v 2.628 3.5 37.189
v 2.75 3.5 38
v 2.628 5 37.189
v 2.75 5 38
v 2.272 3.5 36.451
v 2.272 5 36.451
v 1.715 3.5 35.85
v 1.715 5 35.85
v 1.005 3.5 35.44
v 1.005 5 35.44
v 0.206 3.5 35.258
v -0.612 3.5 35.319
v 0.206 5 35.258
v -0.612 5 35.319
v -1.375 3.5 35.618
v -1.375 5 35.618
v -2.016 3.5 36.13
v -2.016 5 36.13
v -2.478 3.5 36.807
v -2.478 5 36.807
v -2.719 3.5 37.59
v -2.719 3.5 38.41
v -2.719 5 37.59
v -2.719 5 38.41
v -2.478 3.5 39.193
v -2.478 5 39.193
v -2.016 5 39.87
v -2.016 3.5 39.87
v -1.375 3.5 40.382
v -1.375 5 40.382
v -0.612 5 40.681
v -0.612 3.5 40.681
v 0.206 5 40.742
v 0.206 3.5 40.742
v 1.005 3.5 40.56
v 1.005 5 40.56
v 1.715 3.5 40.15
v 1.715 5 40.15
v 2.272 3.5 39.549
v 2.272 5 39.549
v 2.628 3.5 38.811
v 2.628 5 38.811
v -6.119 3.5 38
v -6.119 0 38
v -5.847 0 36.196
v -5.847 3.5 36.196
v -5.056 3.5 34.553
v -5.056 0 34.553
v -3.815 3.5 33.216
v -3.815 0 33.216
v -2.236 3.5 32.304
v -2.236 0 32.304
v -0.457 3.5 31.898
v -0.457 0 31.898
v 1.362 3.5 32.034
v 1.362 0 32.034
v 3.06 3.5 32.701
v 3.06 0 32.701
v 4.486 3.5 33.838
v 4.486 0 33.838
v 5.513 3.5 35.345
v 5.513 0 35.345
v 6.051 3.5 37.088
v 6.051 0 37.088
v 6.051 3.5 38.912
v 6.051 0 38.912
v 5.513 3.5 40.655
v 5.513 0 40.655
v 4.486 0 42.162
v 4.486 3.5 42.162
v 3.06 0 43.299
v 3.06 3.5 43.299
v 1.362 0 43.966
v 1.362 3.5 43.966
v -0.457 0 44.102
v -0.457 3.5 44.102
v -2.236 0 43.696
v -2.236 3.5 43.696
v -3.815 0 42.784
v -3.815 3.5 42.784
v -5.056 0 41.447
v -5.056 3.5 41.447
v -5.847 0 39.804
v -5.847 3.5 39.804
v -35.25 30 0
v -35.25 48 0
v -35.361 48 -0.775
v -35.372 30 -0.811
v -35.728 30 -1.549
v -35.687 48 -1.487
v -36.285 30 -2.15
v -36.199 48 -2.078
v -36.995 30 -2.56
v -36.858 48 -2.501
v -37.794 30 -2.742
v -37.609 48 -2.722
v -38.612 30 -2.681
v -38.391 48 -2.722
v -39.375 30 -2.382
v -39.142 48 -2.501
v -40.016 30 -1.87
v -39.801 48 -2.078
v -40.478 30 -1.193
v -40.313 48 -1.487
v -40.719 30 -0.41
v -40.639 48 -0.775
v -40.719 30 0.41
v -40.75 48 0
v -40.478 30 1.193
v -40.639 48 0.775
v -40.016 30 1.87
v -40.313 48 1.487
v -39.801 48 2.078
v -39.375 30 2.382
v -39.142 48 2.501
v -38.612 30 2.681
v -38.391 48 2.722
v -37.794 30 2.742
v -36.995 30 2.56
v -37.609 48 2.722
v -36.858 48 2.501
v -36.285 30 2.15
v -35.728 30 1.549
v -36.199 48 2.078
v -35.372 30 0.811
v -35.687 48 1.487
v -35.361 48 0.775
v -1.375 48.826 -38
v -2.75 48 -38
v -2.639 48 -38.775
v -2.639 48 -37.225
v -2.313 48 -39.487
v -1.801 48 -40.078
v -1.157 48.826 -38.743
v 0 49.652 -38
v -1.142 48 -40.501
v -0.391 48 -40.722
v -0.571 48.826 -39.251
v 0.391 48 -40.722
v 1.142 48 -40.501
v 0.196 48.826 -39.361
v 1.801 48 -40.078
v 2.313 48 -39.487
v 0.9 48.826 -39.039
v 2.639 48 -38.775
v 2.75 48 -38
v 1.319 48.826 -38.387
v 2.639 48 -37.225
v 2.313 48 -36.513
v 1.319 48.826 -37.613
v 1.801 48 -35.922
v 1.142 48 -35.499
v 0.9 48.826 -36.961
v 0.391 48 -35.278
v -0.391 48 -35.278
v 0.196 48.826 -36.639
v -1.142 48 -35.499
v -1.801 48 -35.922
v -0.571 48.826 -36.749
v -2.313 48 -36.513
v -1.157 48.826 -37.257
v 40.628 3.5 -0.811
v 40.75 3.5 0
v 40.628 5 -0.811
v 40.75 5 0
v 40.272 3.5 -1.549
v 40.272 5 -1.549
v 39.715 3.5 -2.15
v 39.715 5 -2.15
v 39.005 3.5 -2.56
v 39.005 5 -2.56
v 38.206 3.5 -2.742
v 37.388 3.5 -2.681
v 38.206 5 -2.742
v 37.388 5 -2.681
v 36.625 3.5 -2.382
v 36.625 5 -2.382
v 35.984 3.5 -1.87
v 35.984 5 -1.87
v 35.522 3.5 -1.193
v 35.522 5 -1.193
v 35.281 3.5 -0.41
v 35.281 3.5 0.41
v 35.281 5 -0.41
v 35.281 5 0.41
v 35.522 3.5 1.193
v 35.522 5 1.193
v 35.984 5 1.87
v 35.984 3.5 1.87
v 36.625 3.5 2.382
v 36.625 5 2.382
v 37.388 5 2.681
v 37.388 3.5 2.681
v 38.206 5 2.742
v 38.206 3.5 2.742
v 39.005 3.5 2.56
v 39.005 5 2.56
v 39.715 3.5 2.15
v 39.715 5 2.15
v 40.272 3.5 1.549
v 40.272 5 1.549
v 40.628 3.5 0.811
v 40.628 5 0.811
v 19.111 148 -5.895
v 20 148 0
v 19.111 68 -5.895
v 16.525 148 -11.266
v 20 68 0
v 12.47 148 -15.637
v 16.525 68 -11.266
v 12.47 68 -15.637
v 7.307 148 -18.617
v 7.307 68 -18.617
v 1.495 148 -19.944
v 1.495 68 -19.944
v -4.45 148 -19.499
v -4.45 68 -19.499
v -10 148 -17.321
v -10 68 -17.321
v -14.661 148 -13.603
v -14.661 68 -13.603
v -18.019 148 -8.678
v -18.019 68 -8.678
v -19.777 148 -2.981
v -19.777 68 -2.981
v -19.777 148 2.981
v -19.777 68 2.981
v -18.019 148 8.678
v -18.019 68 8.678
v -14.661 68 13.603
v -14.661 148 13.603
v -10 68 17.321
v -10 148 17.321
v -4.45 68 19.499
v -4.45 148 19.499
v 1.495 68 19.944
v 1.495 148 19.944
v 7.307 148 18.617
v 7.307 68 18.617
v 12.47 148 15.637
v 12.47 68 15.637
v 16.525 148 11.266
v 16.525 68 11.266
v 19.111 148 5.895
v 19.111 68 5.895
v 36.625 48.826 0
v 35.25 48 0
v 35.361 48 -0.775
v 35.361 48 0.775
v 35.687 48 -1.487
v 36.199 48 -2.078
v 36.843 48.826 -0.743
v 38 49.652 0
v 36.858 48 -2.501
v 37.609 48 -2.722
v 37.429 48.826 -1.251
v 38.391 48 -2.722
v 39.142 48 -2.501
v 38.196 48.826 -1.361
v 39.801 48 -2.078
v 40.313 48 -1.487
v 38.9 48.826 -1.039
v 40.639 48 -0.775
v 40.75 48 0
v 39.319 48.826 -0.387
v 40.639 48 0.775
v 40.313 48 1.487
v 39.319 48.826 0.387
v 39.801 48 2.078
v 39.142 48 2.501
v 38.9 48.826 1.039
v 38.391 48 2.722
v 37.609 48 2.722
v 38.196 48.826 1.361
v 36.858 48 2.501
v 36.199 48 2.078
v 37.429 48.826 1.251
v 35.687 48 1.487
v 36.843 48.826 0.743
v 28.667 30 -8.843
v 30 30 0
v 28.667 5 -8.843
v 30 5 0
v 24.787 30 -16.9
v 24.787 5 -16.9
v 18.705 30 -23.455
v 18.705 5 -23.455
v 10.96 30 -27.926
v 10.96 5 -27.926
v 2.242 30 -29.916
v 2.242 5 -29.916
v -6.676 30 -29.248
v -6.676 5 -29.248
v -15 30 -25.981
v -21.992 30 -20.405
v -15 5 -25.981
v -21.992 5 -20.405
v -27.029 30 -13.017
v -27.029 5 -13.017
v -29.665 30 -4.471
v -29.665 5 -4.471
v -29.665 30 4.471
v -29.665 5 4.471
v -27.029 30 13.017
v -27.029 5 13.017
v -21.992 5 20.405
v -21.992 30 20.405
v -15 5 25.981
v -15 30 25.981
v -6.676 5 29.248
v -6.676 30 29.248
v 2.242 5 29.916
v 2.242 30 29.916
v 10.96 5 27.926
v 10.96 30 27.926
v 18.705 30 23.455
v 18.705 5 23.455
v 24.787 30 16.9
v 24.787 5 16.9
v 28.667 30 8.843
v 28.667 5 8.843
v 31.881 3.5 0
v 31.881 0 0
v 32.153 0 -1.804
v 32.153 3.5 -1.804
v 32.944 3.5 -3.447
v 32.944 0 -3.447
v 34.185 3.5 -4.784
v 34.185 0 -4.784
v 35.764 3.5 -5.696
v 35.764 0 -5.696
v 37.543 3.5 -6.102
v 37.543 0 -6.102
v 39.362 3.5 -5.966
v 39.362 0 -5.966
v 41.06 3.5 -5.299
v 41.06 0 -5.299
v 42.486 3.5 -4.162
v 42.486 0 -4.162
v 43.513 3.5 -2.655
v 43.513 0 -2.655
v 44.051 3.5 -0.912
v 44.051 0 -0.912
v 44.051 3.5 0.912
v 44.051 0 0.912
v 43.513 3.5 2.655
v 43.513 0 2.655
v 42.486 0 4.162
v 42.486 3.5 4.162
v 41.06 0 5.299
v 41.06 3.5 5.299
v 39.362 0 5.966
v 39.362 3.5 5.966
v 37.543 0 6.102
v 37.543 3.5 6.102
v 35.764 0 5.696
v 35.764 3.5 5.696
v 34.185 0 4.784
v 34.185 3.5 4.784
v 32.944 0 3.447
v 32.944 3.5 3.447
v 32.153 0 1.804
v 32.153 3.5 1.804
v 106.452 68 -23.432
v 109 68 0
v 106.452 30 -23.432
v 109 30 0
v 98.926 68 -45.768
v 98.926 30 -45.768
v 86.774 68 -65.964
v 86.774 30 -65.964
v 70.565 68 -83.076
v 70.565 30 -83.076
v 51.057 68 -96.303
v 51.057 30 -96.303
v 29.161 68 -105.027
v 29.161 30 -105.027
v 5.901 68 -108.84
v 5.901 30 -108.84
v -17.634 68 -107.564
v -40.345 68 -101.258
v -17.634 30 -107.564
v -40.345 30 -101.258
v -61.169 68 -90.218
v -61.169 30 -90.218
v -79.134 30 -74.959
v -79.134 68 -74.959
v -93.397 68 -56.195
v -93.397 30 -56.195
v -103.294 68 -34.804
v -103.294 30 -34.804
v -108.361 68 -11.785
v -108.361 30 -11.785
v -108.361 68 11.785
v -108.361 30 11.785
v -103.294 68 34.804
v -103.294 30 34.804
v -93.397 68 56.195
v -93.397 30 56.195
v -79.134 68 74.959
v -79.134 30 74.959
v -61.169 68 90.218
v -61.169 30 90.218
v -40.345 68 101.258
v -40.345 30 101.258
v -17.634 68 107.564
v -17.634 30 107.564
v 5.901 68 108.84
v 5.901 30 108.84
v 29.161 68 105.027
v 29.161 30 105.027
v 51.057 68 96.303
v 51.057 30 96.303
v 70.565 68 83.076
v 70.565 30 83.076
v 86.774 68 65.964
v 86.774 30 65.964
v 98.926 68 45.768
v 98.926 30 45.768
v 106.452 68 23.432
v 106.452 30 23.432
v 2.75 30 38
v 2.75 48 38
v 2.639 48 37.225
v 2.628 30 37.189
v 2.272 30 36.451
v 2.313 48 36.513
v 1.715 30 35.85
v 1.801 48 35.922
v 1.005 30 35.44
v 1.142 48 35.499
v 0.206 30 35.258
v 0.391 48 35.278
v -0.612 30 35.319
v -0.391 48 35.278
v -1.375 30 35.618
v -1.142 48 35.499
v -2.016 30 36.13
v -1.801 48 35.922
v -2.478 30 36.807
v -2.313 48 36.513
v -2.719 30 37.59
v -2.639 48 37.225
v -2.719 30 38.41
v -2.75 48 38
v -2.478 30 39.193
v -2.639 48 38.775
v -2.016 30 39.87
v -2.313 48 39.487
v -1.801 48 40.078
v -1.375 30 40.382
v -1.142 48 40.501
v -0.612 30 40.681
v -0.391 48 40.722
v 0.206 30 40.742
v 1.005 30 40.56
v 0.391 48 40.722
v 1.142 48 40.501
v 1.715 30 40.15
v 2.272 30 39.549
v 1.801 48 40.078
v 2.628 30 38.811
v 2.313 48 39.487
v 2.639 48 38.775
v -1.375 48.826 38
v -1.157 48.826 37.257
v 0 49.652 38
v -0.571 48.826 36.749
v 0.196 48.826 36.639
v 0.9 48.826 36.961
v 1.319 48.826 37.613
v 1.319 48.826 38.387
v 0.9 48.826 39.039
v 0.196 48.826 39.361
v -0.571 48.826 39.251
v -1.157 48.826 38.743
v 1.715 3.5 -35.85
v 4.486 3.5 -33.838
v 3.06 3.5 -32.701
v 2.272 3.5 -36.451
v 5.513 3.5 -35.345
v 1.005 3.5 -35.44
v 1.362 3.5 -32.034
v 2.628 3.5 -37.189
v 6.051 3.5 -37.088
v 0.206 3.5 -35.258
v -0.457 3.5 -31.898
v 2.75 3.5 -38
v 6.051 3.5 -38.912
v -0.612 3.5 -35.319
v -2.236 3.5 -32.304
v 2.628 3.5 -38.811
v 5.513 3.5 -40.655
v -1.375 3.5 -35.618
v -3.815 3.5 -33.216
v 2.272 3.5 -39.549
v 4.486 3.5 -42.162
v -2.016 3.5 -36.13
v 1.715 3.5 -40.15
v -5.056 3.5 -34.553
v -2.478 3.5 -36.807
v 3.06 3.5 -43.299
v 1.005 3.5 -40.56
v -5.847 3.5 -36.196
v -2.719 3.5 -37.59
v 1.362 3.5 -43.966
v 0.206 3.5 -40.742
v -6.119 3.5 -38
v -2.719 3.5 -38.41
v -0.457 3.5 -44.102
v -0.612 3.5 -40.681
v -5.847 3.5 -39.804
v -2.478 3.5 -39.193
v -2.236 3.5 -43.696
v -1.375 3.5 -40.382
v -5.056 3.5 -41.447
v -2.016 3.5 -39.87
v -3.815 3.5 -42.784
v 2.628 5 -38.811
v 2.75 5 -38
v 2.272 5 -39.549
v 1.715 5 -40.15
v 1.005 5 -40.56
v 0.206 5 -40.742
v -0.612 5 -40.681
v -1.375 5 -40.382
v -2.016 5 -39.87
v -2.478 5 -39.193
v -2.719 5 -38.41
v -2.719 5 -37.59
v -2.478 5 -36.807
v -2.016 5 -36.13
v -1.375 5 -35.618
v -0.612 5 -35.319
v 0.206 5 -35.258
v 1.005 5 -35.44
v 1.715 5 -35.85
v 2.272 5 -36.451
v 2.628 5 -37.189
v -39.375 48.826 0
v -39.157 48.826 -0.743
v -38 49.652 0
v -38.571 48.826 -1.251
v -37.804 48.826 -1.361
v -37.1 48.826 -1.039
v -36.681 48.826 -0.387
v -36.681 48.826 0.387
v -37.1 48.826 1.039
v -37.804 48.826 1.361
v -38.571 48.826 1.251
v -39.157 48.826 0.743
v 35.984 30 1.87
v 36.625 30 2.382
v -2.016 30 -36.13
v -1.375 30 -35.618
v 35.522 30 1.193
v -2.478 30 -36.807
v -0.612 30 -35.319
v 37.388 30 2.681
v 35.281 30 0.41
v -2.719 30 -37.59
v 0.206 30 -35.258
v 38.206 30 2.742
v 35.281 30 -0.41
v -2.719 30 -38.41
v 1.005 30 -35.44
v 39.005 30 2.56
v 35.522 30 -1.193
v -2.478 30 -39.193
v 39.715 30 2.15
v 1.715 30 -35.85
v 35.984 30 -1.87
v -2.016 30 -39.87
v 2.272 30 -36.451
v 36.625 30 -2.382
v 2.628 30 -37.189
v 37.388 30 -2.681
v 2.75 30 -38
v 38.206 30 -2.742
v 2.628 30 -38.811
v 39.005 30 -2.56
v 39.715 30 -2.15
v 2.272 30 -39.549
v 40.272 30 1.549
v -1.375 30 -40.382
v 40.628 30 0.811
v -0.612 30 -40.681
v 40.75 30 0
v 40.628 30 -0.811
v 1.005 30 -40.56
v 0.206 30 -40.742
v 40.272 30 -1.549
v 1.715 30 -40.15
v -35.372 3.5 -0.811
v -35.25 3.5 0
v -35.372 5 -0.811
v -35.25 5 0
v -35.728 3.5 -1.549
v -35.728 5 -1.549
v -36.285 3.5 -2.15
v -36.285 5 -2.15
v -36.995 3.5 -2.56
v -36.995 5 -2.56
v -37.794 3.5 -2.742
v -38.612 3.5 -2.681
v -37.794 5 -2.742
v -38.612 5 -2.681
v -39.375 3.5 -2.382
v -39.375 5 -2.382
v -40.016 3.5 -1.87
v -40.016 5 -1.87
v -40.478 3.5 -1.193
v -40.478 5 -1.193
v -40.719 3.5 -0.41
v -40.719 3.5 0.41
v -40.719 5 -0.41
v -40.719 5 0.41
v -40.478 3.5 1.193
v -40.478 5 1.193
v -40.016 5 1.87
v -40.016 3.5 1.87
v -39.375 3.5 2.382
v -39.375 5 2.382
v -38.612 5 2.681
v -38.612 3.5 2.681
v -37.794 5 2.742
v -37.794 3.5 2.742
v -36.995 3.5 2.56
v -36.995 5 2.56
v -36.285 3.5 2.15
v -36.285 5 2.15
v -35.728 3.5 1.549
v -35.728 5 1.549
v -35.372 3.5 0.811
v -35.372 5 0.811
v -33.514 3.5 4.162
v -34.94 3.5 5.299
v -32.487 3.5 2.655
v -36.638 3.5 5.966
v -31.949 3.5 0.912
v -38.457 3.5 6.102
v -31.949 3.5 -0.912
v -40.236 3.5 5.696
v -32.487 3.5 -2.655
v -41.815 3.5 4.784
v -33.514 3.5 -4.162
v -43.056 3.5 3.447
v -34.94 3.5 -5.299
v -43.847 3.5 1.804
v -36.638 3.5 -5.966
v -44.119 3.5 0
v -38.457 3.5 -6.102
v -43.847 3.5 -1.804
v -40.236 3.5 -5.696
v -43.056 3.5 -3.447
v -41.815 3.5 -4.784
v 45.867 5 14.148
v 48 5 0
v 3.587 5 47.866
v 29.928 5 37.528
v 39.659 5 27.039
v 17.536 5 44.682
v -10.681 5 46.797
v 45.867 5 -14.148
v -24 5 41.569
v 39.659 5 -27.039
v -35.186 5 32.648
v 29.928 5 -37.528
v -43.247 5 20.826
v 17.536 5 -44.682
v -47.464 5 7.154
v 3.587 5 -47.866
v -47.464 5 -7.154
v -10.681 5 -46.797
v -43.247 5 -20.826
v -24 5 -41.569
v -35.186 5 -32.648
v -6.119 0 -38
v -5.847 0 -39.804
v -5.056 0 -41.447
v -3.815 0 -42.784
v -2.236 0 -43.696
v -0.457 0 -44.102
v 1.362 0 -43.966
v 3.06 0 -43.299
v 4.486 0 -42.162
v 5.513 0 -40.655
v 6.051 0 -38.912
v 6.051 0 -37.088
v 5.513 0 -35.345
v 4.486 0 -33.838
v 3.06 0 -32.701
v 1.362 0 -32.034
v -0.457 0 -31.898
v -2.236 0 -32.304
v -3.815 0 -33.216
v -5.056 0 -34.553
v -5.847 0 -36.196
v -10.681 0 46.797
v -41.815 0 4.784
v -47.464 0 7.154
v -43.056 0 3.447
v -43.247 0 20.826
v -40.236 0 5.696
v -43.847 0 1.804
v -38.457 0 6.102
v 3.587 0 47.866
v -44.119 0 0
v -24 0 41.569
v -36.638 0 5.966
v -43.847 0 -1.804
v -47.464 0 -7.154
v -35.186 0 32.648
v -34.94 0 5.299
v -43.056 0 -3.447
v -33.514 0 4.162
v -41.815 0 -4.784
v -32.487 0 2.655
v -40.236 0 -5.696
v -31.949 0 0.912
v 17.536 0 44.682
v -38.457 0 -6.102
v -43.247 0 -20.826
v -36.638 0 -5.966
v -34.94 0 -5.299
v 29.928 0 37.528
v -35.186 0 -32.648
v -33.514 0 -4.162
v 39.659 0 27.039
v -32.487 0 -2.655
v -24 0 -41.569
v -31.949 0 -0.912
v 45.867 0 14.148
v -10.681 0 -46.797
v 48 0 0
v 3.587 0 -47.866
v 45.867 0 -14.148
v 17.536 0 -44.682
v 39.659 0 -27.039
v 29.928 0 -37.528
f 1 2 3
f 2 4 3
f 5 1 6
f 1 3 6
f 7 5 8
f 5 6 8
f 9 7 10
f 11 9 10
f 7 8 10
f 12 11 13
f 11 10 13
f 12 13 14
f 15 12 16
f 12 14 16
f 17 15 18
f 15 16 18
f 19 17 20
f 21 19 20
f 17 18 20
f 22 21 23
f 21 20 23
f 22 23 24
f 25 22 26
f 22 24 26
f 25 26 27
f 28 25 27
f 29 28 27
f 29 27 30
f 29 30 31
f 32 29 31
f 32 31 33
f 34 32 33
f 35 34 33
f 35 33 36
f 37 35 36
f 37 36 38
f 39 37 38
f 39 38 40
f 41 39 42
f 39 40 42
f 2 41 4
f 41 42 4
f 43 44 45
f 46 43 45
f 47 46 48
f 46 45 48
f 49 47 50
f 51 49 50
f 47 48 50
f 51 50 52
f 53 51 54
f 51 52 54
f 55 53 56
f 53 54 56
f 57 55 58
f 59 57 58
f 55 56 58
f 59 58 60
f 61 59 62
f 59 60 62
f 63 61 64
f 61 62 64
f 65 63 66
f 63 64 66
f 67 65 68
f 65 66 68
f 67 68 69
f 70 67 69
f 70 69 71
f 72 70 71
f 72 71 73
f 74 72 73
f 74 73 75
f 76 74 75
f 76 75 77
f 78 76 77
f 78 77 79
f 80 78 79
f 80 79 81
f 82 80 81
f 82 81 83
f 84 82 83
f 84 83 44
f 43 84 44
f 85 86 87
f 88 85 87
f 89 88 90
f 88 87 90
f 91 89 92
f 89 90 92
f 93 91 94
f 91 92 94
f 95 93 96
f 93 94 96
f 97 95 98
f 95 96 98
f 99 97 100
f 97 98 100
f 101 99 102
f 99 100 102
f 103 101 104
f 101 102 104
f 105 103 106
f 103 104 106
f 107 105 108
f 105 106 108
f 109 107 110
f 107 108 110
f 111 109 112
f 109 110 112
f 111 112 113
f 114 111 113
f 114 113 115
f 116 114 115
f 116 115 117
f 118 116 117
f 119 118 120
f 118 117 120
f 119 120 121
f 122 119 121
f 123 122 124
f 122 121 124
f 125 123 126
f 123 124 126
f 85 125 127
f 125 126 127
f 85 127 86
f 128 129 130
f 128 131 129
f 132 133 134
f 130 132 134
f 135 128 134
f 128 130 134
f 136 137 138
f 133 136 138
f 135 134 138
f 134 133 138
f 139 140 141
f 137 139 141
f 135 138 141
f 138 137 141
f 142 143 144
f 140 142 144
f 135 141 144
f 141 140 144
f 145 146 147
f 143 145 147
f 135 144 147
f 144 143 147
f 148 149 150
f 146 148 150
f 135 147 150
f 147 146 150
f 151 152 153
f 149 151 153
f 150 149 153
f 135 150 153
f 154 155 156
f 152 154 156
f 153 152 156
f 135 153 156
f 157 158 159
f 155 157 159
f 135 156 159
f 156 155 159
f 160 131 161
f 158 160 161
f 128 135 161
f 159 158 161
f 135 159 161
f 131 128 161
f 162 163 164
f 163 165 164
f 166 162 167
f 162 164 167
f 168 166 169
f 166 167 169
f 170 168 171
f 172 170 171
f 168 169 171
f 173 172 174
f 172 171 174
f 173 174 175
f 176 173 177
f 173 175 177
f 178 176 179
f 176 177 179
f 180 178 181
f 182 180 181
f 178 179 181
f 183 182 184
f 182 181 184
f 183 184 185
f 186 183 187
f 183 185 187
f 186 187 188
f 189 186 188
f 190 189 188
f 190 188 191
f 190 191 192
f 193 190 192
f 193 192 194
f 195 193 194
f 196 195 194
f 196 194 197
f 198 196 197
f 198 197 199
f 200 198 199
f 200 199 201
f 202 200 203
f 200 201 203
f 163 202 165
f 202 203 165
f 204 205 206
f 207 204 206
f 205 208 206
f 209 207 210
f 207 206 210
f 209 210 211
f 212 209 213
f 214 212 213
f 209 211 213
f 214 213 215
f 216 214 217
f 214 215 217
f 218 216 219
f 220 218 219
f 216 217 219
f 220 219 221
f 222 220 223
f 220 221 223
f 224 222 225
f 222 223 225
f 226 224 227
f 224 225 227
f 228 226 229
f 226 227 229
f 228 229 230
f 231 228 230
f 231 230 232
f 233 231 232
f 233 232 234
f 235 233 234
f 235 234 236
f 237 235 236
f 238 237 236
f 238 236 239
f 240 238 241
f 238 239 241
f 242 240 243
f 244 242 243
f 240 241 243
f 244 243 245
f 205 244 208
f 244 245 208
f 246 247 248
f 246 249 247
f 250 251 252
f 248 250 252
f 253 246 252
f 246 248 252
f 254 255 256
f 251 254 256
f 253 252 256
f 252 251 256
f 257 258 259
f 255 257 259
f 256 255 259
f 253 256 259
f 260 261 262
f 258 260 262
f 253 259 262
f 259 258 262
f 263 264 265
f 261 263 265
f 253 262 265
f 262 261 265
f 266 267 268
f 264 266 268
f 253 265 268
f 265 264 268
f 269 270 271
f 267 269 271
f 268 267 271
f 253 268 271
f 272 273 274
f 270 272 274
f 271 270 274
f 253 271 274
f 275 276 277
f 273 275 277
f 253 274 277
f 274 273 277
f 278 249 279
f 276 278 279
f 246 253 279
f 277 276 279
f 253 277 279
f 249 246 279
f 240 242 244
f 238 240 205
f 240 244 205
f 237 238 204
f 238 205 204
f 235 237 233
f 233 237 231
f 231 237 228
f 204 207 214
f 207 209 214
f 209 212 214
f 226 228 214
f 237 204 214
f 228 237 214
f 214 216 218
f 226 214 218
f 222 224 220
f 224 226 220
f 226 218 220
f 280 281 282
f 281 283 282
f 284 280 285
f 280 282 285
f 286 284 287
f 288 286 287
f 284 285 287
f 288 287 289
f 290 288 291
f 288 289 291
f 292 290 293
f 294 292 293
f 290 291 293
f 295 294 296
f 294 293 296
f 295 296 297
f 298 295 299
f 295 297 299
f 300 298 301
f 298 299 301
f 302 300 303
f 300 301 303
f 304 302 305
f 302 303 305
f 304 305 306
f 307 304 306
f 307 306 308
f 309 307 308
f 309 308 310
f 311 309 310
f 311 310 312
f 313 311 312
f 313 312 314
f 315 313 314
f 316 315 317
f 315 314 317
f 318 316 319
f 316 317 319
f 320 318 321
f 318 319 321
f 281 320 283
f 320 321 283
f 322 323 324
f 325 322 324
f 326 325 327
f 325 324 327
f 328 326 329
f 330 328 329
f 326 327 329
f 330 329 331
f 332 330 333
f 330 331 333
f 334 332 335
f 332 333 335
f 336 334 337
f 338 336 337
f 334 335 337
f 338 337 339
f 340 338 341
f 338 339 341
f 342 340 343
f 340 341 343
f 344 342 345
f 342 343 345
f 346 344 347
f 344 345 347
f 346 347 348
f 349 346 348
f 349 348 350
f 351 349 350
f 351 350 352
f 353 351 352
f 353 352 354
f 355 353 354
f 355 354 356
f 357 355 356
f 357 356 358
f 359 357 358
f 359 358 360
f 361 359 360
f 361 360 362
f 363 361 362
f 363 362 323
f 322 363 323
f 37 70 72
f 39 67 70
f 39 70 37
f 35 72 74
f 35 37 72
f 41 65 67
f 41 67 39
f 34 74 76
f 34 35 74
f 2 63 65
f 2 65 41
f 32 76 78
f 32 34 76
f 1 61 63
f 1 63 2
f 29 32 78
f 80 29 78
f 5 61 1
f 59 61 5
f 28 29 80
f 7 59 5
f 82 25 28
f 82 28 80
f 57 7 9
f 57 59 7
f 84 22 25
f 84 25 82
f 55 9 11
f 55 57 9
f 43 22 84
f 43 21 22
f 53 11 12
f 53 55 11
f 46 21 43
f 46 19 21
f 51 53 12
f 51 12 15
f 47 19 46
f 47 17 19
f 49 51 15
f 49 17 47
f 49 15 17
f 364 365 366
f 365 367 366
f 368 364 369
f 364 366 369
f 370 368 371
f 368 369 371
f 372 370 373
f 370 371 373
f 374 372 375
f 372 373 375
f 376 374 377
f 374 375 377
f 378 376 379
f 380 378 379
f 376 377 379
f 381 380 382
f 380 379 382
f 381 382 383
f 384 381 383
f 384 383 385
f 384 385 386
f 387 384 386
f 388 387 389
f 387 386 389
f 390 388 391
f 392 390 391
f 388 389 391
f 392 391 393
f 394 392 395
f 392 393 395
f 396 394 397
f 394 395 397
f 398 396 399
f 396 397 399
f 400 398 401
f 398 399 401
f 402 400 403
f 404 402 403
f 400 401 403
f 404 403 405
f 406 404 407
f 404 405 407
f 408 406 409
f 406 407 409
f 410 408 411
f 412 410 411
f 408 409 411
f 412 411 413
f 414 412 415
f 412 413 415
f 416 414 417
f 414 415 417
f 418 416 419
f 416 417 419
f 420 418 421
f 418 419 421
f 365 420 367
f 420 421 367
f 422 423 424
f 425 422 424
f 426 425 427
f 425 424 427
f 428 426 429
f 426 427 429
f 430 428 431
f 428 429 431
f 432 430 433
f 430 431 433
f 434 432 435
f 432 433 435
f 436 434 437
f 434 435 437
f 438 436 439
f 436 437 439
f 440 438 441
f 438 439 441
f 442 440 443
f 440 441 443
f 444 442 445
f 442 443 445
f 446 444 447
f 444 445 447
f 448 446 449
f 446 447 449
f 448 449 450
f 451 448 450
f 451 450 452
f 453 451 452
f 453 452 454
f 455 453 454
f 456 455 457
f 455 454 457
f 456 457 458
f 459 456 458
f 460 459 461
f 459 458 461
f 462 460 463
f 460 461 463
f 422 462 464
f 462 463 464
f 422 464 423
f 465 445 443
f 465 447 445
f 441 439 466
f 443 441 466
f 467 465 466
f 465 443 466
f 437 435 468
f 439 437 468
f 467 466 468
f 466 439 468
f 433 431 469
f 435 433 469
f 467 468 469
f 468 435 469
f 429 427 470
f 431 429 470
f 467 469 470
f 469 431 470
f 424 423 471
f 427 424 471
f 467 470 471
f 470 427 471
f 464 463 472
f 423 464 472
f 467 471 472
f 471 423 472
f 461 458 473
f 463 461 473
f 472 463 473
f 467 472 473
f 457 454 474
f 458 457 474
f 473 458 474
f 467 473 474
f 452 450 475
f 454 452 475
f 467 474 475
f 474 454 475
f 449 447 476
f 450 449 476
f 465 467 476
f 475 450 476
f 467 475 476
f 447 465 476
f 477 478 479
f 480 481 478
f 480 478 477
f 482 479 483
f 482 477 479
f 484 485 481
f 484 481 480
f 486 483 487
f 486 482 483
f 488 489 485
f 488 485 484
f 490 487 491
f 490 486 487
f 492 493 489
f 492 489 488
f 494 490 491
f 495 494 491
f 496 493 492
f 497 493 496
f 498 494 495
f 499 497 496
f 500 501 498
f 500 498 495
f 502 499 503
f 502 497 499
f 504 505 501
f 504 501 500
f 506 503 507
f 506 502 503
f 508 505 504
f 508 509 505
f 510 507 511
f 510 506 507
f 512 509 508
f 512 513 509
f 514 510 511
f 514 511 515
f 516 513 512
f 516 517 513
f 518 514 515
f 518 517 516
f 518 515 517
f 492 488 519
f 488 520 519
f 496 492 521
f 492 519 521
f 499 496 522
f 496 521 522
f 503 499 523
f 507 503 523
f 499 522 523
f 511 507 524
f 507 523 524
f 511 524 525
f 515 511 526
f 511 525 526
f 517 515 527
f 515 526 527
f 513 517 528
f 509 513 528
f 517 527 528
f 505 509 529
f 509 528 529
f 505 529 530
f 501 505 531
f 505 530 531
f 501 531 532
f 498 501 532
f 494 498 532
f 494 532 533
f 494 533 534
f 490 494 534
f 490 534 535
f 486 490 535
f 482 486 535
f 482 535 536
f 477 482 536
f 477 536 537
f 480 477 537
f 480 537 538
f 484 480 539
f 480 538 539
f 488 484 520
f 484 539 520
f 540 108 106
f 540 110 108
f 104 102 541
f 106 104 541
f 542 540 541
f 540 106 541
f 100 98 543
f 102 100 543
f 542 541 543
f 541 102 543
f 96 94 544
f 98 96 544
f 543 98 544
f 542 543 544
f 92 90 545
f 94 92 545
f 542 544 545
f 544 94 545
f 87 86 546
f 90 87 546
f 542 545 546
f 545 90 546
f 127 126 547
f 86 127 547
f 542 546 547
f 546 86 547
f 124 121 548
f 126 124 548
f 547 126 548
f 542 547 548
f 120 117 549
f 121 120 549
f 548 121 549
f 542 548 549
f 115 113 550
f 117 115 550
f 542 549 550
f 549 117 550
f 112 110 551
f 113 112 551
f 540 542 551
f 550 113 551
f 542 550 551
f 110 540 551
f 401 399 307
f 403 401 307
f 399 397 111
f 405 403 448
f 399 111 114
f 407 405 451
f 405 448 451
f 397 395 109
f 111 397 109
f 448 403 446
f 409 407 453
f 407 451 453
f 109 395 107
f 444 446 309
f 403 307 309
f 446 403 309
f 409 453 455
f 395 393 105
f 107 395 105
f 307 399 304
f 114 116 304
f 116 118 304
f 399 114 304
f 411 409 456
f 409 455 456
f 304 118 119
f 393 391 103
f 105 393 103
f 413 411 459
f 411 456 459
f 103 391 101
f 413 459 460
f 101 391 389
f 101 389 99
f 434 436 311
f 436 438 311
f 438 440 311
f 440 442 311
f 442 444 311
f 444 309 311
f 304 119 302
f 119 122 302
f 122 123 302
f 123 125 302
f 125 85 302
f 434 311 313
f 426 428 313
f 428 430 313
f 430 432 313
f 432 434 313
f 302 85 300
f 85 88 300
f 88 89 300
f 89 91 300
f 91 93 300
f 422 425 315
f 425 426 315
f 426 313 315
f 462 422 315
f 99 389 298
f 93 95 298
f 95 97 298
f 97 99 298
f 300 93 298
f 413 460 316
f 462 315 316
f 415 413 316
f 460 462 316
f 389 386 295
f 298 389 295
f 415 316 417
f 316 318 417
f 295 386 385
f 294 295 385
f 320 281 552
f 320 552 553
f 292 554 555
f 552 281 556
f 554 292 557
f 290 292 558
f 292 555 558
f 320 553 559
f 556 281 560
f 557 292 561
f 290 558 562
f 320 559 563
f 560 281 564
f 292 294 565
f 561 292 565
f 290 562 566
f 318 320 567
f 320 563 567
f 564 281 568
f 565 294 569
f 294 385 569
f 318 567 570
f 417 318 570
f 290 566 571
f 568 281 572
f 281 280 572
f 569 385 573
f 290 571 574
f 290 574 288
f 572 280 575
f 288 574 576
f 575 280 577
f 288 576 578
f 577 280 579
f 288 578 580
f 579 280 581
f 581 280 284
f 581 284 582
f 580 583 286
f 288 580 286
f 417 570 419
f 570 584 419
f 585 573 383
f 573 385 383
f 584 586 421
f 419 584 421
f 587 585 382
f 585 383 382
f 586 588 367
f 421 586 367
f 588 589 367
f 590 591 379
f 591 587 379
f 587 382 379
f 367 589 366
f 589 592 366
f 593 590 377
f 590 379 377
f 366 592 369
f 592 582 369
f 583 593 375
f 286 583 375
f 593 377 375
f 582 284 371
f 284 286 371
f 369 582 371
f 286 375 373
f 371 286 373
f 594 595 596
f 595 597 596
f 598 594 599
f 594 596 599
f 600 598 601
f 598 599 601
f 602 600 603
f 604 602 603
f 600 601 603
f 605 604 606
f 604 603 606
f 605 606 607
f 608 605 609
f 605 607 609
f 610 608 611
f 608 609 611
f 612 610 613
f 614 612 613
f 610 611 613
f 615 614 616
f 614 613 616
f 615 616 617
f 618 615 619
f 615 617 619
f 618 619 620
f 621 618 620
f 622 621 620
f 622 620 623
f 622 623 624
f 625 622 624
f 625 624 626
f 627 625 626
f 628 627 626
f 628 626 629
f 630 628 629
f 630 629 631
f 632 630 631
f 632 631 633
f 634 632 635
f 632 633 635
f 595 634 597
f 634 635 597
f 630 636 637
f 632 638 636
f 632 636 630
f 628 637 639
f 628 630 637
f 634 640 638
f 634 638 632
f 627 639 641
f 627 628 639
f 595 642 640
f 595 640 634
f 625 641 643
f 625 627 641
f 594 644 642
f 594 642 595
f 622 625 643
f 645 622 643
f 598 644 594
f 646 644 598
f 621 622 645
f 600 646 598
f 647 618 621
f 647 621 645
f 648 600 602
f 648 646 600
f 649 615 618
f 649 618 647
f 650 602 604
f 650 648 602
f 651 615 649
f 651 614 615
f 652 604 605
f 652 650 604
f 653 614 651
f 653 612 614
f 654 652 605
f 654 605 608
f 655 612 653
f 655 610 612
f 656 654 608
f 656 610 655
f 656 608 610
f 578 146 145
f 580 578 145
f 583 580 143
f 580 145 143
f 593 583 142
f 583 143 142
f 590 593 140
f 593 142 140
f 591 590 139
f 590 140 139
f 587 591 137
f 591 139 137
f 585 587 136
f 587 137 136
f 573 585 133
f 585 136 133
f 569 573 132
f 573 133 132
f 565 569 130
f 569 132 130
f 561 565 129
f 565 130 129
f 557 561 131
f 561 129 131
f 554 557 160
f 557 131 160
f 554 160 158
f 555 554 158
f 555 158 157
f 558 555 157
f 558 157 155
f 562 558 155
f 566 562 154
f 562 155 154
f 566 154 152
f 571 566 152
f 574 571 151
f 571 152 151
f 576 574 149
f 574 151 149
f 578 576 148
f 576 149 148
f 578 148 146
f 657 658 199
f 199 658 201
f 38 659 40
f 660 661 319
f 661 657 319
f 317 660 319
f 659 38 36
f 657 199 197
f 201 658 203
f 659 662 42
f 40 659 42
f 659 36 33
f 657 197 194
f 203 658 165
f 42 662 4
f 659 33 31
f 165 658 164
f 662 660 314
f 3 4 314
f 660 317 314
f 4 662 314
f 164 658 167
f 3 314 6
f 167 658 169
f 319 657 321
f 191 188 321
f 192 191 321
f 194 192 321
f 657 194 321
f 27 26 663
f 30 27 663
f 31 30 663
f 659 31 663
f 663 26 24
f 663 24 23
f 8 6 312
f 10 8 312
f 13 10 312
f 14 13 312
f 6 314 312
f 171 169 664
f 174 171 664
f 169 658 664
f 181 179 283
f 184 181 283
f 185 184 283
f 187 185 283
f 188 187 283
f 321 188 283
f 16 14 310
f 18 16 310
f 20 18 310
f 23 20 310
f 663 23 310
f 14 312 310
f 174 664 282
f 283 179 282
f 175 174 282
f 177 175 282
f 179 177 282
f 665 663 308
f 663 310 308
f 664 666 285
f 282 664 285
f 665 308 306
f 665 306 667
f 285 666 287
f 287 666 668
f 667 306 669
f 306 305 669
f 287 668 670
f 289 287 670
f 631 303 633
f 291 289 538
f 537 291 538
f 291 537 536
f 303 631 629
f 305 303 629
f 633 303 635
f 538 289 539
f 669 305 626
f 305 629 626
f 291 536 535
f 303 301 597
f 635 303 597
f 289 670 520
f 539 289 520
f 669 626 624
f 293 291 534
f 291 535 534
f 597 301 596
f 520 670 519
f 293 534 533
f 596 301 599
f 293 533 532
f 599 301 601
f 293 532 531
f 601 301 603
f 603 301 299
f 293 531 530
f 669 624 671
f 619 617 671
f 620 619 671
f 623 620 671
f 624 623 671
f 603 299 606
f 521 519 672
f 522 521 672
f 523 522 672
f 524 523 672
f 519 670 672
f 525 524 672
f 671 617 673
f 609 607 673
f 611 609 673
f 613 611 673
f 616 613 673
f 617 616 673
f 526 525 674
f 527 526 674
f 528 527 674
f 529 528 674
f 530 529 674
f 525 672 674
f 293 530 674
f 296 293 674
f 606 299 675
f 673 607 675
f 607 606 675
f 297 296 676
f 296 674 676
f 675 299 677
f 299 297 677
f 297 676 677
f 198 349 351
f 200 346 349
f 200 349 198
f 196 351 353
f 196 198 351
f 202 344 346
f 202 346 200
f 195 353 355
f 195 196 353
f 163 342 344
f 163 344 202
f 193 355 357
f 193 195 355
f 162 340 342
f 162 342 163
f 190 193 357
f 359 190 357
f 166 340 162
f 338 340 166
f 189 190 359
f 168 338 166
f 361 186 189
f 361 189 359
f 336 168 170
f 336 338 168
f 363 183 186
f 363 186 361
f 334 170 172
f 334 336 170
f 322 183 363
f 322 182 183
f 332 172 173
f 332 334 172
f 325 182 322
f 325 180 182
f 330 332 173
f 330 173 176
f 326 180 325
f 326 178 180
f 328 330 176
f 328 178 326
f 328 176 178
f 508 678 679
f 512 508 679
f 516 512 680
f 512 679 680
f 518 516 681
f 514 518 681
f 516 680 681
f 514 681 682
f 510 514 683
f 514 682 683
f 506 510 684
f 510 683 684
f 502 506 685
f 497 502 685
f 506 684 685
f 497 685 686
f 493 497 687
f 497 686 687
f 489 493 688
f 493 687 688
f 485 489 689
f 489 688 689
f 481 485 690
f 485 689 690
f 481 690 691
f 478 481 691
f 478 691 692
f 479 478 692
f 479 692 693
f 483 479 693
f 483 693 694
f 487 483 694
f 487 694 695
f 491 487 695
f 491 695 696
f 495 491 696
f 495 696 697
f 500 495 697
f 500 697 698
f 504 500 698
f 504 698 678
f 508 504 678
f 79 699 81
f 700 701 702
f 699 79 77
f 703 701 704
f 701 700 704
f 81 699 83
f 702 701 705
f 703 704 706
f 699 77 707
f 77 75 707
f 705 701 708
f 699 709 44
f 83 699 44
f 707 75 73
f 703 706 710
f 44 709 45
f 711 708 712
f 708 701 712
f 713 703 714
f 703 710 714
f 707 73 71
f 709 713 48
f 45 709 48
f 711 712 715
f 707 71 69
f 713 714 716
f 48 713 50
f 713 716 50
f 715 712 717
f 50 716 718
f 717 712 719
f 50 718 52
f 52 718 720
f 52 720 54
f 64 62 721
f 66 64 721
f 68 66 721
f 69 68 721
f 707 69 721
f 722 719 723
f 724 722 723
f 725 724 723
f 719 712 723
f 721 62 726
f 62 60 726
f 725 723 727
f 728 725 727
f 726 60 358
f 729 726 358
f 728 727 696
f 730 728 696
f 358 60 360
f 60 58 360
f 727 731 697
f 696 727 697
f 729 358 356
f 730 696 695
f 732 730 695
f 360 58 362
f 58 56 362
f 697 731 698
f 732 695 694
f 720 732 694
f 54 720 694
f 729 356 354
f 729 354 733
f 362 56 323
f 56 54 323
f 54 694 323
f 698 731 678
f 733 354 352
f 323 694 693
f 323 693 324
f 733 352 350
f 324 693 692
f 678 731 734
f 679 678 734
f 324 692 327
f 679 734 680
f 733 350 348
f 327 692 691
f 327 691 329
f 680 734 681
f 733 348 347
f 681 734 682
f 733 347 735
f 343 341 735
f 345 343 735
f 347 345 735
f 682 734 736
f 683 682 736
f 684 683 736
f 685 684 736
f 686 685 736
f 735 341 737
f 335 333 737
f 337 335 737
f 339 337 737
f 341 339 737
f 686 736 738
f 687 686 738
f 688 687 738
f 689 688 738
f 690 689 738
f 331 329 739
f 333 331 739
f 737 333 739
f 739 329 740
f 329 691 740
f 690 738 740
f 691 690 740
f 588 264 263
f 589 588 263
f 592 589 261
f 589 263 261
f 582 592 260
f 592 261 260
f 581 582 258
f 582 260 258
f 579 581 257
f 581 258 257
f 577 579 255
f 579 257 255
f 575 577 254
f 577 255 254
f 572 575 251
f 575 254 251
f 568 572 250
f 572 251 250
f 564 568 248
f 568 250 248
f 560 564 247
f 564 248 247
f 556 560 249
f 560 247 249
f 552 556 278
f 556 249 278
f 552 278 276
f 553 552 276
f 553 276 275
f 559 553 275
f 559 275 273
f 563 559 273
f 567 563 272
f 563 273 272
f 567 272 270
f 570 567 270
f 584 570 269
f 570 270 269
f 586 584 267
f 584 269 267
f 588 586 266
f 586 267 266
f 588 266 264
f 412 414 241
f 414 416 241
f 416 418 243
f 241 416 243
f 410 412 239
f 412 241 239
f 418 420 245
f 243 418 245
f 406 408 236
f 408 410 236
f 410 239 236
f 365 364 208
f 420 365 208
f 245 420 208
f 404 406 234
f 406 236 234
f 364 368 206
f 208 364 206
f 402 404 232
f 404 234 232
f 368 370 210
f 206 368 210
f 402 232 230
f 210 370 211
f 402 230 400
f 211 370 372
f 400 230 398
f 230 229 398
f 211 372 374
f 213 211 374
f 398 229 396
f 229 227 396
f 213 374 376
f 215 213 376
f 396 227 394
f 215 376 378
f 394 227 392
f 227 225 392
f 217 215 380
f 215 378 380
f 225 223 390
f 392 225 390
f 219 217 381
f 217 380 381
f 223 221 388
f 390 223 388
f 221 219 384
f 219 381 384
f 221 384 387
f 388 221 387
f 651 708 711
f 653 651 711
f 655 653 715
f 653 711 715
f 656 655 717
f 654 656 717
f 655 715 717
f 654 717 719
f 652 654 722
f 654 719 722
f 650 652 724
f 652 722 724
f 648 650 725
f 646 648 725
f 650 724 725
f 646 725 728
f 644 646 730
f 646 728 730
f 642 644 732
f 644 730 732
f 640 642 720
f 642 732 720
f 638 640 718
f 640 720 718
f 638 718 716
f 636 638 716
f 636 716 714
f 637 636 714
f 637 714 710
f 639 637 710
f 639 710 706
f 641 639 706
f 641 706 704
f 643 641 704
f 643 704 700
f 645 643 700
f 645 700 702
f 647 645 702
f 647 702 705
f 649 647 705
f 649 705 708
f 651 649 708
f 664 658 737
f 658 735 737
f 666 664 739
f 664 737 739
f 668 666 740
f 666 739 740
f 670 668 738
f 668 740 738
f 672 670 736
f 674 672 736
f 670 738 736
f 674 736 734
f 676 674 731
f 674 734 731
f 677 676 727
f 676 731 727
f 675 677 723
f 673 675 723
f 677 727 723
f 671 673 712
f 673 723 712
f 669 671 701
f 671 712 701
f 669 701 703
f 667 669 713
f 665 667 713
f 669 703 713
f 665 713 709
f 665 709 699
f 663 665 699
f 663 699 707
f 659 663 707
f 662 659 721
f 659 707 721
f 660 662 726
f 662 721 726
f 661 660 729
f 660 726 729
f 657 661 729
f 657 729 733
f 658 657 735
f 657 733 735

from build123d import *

# Parameters (mm, degrees)
FORO_LAMATO_PER_BULLONE_M5_A_TESTA_ESAGO_D           = 5.5
FORO_LAMATO_PER_BULLONE_M5_A_TESTA_ESAGO_DEPTH       = 48
FORO_LAMATO_PER_BULLONE_M5_A_TESTA_ESAGO_CBORE_D     = 12.238
FORO_LAMATO_PER_BULLONE_M5_A_TESTA_ESAGO_CBORE_DEPTH = 3.5
FORO_LAMATO_PER_BULLONE_M5_A_TESTA_ESAGO_TIP         = 1.652366702


with BuildPart() as part:
    # Schizzo1 → Rivoluzione1 (revolve)
    with BuildSketch(Plane.XY):
        Polygon((20, 68), (109, 68), (109, 30), (30, 30), (30, 5), (48, 5), (48, 0), (0, 0), (0, 148), (20, 148), align=None)
    revolve(axis=Axis((0, -1000, 0), (0, 1, 0)))

    # Foro lamato per Bullone M5 a testa esagonale-1
    with Locations(Plane(origin=(0, 0, 0), x_dir=(-1, 0, 0), z_dir=(0, -1, 0))):
        with Locations((0, 38), (-38, 0), (0, -38), (38, 0)):
            CounterBoreHole(FORO_LAMATO_PER_BULLONE_M5_A_TESTA_ESAGO_D / 2, FORO_LAMATO_PER_BULLONE_M5_A_TESTA_ESAGO_CBORE_D / 2, FORO_LAMATO_PER_BULLONE_M5_A_TESTA_ESAGO_CBORE_DEPTH, depth=FORO_LAMATO_PER_BULLONE_M5_A_TESTA_ESAGO_DEPTH)
            with Locations((0, 0, -(FORO_LAMATO_PER_BULLONE_M5_A_TESTA_ESAGO_DEPTH + FORO_LAMATO_PER_BULLONE_M5_A_TESTA_ESAGO_TIP / 2))):  # 118° drill point
                Cone(0, FORO_LAMATO_PER_BULLONE_M5_A_TESTA_ESAGO_D / 2, FORO_LAMATO_PER_BULLONE_M5_A_TESTA_ESAGO_TIP, mode=Mode.SUBTRACT)


solid = part.part
